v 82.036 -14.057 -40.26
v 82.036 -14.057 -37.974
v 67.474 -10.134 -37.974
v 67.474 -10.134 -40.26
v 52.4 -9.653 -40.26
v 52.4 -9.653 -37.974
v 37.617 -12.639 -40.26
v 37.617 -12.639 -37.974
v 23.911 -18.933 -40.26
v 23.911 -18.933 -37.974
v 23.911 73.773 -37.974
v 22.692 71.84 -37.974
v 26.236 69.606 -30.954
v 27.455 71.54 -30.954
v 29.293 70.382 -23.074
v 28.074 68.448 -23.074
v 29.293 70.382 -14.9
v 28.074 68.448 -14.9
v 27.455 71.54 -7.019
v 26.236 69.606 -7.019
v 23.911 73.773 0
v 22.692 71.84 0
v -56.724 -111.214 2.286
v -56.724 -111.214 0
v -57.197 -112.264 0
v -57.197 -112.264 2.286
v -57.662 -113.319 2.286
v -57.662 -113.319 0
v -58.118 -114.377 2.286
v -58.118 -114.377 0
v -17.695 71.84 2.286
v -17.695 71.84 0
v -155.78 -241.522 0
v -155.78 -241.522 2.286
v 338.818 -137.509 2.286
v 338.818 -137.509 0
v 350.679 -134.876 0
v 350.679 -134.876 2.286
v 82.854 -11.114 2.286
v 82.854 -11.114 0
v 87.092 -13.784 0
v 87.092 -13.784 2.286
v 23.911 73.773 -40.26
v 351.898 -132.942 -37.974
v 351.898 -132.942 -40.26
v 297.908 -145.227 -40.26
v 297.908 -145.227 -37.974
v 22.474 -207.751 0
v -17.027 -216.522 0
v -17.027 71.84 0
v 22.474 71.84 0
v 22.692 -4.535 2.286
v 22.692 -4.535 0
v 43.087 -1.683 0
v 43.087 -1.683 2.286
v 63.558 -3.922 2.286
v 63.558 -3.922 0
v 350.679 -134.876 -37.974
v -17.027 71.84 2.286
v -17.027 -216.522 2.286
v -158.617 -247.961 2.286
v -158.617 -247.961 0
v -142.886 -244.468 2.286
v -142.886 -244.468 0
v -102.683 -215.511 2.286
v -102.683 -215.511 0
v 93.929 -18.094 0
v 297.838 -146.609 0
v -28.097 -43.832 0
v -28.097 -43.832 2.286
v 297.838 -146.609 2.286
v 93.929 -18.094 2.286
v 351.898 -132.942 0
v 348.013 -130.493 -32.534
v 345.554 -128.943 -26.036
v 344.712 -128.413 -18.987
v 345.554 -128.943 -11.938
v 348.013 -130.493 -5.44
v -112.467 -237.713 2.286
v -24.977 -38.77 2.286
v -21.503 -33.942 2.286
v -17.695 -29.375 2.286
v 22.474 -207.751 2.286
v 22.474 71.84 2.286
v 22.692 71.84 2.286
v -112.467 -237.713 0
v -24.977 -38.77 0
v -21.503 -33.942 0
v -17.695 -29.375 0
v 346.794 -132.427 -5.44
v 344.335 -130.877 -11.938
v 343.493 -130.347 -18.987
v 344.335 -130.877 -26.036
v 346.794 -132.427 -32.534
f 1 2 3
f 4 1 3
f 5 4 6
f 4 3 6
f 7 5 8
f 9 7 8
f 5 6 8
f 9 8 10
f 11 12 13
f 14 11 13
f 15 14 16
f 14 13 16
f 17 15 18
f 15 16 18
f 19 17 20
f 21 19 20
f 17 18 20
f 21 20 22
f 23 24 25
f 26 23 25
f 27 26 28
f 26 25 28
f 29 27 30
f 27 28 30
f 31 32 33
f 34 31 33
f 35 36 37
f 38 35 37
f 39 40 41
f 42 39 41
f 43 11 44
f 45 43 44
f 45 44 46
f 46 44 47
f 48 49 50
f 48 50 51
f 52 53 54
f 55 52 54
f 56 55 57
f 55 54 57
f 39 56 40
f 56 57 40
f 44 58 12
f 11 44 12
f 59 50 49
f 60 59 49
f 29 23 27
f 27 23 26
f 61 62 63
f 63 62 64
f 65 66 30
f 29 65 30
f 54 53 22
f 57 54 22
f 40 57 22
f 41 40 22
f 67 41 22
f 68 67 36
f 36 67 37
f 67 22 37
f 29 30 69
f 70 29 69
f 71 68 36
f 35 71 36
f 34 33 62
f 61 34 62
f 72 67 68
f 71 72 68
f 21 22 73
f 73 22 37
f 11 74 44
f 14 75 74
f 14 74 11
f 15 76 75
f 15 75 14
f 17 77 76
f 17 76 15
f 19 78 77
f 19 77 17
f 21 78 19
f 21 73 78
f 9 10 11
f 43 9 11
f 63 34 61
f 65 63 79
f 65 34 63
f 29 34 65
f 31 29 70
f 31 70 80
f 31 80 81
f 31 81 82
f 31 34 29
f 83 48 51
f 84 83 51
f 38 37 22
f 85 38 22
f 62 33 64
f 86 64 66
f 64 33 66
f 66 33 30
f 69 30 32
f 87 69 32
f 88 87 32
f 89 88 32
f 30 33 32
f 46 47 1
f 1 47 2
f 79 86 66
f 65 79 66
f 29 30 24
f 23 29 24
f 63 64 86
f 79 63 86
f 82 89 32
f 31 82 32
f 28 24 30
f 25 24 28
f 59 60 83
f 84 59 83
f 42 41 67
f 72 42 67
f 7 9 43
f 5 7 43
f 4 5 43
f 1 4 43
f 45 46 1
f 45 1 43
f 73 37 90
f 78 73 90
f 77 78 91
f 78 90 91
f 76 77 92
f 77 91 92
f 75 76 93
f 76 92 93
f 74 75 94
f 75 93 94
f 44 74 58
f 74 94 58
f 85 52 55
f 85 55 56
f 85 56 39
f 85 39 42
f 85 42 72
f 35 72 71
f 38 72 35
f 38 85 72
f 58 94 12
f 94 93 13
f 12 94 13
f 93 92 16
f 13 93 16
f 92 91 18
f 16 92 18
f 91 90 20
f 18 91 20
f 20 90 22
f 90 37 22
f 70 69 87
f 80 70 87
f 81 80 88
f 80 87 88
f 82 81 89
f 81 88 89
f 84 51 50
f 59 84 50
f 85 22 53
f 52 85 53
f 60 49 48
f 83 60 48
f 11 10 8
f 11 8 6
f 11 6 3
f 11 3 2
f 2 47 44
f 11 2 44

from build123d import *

# Parameters (mm, degrees)
F1_DEPTH = 2.286
F3_DEPTH = 2.286
F5_DEPTH = 2.286


with BuildPart() as f1:
    # F0 (on Top) → F1 (new body)
    with BuildSketch(Plane.XY):
        with BuildLine():
            ThreePointArc((-56.723663, -111.214013), (-57.430666, -112.791182), (-58.117557, -114.377212))
            Line((-58.117557, -114.377212), (-56.723663, -111.214013))
        make_face()
        Polygon((22.474397, 71.839522), (-17.027309, 71.839522), (-17.027309, -216.521665), (22.474397, -207.750656), align=None)
        with BuildLine():
            Line((-17.694519, -22.644171), (-17.694519, 61.457966))
            Line((-17.694519, 61.457966), (-17.694519, 71.839522))
            Line((-17.694519, 71.839522), (-155.780335, -241.522176))
            ThreePointArc((-155.780335, -241.522176), (-148.931893, -241.237791), (-142.886162, -244.467523))
            Line((-142.886162, -244.467523), (-112.466712, -237.71315))
            Line((-112.466712, -237.71315), (-102.683023, -215.510772))
            Line((-102.683023, -215.510772), (-58.117557, -114.377212))
            Line((-58.117557, -114.377212), (-28.096603, -43.832372))
            ThreePointArc((-28.096603, -43.832372), (-23.283061, -36.324813), (-17.694519, -29.374863))
            Line((-17.694519, -29.374863), (-17.694519, -22.644171))
        make_face()
        with BuildLine():
            ThreePointArc((-142.886162, -244.467523), (-148.931893, -241.237791), (-155.780335, -241.522176))
            Line((-155.780335, -241.522176), (-158.617452, -247.960519))
            Line((-158.617452, -247.960519), (-142.886162, -244.467523))
        make_face()
        with BuildLine():
            Line((350.67878, -134.875741), (22.69241, 71.839522))
            Line((22.69241, 71.839522), (22.69241, 61.457966))
            Line((22.69241, 61.457966), (22.69241, -4.534557))
            ThreePointArc((22.69241, -4.534557), (53.391845, -2.167318), (82.854106, -11.113509))
            Line((82.854106, -11.113509), (87.091994, -13.784461))
            ThreePointArc((87.091994, -13.784461), (90.589179, -15.814345), (93.929176, -18.093634))
            Line((93.929176, -18.093634), (297.838295, -146.608509))
            Line((297.838295, -146.608509), (338.818103, -137.5093))
            Line((338.818103, -137.5093), (350.67878, -134.875741))
        make_face()
        with BuildLine():
            ThreePointArc((93.929176, -18.093634), (90.589179, -15.814345), (87.091994, -13.784461))
            Line((87.091994, -13.784461), (93.929176, -18.093634))
        make_face()
    extrude(amount=F1_DEPTH)


with BuildPart() as f3:
    # F2 (on face) → F3 (new body)
    with BuildSketch(Plane(origin=(38.856521, 61.652, 0), x_dir=(-0.845994, 0.533192, 0), z_dir=(0.533192, 0.845994, 0))):
        with BuildLine():
            ThreePointArc((19.106651, -37.973765), (12.470038, -18.986883), (19.106651, 0))
            Line((19.106651, 0), (-368.58686, 0))
            ThreePointArc((-368.58686, 0), (-360.093463, -18.986883), (-368.58686, -37.973765))
            Line((-368.58686, -37.973765), (19.106651, -37.973765))
        make_face()
    extrude(amount=F3_DEPTH)


with BuildPart() as f5:
    # F4 (on face) → F5 (new body)
    with BuildSketch(Plane(origin=(0, 0, -37.973765), x_dir=(1, 0, 0), z_dir=(0, 0, -1))):
        with BuildLine():
            Line((23.911288, 18.932939), (23.911288, -73.773465))
            Line((23.911288, -73.773465), (351.897658, 132.941799))
            Line((351.897658, 132.941799), (297.907526, 145.227078))
            Line((297.907526, 145.227078), (82.036233, 14.05673))
            ThreePointArc((82.036233, 14.05673), (52.399748, 9.652539), (23.911288, 18.932939))
        make_face()
    extrude(amount=F5_DEPTH)


solid = Compound([f1.part, f3.part, f5.part])
